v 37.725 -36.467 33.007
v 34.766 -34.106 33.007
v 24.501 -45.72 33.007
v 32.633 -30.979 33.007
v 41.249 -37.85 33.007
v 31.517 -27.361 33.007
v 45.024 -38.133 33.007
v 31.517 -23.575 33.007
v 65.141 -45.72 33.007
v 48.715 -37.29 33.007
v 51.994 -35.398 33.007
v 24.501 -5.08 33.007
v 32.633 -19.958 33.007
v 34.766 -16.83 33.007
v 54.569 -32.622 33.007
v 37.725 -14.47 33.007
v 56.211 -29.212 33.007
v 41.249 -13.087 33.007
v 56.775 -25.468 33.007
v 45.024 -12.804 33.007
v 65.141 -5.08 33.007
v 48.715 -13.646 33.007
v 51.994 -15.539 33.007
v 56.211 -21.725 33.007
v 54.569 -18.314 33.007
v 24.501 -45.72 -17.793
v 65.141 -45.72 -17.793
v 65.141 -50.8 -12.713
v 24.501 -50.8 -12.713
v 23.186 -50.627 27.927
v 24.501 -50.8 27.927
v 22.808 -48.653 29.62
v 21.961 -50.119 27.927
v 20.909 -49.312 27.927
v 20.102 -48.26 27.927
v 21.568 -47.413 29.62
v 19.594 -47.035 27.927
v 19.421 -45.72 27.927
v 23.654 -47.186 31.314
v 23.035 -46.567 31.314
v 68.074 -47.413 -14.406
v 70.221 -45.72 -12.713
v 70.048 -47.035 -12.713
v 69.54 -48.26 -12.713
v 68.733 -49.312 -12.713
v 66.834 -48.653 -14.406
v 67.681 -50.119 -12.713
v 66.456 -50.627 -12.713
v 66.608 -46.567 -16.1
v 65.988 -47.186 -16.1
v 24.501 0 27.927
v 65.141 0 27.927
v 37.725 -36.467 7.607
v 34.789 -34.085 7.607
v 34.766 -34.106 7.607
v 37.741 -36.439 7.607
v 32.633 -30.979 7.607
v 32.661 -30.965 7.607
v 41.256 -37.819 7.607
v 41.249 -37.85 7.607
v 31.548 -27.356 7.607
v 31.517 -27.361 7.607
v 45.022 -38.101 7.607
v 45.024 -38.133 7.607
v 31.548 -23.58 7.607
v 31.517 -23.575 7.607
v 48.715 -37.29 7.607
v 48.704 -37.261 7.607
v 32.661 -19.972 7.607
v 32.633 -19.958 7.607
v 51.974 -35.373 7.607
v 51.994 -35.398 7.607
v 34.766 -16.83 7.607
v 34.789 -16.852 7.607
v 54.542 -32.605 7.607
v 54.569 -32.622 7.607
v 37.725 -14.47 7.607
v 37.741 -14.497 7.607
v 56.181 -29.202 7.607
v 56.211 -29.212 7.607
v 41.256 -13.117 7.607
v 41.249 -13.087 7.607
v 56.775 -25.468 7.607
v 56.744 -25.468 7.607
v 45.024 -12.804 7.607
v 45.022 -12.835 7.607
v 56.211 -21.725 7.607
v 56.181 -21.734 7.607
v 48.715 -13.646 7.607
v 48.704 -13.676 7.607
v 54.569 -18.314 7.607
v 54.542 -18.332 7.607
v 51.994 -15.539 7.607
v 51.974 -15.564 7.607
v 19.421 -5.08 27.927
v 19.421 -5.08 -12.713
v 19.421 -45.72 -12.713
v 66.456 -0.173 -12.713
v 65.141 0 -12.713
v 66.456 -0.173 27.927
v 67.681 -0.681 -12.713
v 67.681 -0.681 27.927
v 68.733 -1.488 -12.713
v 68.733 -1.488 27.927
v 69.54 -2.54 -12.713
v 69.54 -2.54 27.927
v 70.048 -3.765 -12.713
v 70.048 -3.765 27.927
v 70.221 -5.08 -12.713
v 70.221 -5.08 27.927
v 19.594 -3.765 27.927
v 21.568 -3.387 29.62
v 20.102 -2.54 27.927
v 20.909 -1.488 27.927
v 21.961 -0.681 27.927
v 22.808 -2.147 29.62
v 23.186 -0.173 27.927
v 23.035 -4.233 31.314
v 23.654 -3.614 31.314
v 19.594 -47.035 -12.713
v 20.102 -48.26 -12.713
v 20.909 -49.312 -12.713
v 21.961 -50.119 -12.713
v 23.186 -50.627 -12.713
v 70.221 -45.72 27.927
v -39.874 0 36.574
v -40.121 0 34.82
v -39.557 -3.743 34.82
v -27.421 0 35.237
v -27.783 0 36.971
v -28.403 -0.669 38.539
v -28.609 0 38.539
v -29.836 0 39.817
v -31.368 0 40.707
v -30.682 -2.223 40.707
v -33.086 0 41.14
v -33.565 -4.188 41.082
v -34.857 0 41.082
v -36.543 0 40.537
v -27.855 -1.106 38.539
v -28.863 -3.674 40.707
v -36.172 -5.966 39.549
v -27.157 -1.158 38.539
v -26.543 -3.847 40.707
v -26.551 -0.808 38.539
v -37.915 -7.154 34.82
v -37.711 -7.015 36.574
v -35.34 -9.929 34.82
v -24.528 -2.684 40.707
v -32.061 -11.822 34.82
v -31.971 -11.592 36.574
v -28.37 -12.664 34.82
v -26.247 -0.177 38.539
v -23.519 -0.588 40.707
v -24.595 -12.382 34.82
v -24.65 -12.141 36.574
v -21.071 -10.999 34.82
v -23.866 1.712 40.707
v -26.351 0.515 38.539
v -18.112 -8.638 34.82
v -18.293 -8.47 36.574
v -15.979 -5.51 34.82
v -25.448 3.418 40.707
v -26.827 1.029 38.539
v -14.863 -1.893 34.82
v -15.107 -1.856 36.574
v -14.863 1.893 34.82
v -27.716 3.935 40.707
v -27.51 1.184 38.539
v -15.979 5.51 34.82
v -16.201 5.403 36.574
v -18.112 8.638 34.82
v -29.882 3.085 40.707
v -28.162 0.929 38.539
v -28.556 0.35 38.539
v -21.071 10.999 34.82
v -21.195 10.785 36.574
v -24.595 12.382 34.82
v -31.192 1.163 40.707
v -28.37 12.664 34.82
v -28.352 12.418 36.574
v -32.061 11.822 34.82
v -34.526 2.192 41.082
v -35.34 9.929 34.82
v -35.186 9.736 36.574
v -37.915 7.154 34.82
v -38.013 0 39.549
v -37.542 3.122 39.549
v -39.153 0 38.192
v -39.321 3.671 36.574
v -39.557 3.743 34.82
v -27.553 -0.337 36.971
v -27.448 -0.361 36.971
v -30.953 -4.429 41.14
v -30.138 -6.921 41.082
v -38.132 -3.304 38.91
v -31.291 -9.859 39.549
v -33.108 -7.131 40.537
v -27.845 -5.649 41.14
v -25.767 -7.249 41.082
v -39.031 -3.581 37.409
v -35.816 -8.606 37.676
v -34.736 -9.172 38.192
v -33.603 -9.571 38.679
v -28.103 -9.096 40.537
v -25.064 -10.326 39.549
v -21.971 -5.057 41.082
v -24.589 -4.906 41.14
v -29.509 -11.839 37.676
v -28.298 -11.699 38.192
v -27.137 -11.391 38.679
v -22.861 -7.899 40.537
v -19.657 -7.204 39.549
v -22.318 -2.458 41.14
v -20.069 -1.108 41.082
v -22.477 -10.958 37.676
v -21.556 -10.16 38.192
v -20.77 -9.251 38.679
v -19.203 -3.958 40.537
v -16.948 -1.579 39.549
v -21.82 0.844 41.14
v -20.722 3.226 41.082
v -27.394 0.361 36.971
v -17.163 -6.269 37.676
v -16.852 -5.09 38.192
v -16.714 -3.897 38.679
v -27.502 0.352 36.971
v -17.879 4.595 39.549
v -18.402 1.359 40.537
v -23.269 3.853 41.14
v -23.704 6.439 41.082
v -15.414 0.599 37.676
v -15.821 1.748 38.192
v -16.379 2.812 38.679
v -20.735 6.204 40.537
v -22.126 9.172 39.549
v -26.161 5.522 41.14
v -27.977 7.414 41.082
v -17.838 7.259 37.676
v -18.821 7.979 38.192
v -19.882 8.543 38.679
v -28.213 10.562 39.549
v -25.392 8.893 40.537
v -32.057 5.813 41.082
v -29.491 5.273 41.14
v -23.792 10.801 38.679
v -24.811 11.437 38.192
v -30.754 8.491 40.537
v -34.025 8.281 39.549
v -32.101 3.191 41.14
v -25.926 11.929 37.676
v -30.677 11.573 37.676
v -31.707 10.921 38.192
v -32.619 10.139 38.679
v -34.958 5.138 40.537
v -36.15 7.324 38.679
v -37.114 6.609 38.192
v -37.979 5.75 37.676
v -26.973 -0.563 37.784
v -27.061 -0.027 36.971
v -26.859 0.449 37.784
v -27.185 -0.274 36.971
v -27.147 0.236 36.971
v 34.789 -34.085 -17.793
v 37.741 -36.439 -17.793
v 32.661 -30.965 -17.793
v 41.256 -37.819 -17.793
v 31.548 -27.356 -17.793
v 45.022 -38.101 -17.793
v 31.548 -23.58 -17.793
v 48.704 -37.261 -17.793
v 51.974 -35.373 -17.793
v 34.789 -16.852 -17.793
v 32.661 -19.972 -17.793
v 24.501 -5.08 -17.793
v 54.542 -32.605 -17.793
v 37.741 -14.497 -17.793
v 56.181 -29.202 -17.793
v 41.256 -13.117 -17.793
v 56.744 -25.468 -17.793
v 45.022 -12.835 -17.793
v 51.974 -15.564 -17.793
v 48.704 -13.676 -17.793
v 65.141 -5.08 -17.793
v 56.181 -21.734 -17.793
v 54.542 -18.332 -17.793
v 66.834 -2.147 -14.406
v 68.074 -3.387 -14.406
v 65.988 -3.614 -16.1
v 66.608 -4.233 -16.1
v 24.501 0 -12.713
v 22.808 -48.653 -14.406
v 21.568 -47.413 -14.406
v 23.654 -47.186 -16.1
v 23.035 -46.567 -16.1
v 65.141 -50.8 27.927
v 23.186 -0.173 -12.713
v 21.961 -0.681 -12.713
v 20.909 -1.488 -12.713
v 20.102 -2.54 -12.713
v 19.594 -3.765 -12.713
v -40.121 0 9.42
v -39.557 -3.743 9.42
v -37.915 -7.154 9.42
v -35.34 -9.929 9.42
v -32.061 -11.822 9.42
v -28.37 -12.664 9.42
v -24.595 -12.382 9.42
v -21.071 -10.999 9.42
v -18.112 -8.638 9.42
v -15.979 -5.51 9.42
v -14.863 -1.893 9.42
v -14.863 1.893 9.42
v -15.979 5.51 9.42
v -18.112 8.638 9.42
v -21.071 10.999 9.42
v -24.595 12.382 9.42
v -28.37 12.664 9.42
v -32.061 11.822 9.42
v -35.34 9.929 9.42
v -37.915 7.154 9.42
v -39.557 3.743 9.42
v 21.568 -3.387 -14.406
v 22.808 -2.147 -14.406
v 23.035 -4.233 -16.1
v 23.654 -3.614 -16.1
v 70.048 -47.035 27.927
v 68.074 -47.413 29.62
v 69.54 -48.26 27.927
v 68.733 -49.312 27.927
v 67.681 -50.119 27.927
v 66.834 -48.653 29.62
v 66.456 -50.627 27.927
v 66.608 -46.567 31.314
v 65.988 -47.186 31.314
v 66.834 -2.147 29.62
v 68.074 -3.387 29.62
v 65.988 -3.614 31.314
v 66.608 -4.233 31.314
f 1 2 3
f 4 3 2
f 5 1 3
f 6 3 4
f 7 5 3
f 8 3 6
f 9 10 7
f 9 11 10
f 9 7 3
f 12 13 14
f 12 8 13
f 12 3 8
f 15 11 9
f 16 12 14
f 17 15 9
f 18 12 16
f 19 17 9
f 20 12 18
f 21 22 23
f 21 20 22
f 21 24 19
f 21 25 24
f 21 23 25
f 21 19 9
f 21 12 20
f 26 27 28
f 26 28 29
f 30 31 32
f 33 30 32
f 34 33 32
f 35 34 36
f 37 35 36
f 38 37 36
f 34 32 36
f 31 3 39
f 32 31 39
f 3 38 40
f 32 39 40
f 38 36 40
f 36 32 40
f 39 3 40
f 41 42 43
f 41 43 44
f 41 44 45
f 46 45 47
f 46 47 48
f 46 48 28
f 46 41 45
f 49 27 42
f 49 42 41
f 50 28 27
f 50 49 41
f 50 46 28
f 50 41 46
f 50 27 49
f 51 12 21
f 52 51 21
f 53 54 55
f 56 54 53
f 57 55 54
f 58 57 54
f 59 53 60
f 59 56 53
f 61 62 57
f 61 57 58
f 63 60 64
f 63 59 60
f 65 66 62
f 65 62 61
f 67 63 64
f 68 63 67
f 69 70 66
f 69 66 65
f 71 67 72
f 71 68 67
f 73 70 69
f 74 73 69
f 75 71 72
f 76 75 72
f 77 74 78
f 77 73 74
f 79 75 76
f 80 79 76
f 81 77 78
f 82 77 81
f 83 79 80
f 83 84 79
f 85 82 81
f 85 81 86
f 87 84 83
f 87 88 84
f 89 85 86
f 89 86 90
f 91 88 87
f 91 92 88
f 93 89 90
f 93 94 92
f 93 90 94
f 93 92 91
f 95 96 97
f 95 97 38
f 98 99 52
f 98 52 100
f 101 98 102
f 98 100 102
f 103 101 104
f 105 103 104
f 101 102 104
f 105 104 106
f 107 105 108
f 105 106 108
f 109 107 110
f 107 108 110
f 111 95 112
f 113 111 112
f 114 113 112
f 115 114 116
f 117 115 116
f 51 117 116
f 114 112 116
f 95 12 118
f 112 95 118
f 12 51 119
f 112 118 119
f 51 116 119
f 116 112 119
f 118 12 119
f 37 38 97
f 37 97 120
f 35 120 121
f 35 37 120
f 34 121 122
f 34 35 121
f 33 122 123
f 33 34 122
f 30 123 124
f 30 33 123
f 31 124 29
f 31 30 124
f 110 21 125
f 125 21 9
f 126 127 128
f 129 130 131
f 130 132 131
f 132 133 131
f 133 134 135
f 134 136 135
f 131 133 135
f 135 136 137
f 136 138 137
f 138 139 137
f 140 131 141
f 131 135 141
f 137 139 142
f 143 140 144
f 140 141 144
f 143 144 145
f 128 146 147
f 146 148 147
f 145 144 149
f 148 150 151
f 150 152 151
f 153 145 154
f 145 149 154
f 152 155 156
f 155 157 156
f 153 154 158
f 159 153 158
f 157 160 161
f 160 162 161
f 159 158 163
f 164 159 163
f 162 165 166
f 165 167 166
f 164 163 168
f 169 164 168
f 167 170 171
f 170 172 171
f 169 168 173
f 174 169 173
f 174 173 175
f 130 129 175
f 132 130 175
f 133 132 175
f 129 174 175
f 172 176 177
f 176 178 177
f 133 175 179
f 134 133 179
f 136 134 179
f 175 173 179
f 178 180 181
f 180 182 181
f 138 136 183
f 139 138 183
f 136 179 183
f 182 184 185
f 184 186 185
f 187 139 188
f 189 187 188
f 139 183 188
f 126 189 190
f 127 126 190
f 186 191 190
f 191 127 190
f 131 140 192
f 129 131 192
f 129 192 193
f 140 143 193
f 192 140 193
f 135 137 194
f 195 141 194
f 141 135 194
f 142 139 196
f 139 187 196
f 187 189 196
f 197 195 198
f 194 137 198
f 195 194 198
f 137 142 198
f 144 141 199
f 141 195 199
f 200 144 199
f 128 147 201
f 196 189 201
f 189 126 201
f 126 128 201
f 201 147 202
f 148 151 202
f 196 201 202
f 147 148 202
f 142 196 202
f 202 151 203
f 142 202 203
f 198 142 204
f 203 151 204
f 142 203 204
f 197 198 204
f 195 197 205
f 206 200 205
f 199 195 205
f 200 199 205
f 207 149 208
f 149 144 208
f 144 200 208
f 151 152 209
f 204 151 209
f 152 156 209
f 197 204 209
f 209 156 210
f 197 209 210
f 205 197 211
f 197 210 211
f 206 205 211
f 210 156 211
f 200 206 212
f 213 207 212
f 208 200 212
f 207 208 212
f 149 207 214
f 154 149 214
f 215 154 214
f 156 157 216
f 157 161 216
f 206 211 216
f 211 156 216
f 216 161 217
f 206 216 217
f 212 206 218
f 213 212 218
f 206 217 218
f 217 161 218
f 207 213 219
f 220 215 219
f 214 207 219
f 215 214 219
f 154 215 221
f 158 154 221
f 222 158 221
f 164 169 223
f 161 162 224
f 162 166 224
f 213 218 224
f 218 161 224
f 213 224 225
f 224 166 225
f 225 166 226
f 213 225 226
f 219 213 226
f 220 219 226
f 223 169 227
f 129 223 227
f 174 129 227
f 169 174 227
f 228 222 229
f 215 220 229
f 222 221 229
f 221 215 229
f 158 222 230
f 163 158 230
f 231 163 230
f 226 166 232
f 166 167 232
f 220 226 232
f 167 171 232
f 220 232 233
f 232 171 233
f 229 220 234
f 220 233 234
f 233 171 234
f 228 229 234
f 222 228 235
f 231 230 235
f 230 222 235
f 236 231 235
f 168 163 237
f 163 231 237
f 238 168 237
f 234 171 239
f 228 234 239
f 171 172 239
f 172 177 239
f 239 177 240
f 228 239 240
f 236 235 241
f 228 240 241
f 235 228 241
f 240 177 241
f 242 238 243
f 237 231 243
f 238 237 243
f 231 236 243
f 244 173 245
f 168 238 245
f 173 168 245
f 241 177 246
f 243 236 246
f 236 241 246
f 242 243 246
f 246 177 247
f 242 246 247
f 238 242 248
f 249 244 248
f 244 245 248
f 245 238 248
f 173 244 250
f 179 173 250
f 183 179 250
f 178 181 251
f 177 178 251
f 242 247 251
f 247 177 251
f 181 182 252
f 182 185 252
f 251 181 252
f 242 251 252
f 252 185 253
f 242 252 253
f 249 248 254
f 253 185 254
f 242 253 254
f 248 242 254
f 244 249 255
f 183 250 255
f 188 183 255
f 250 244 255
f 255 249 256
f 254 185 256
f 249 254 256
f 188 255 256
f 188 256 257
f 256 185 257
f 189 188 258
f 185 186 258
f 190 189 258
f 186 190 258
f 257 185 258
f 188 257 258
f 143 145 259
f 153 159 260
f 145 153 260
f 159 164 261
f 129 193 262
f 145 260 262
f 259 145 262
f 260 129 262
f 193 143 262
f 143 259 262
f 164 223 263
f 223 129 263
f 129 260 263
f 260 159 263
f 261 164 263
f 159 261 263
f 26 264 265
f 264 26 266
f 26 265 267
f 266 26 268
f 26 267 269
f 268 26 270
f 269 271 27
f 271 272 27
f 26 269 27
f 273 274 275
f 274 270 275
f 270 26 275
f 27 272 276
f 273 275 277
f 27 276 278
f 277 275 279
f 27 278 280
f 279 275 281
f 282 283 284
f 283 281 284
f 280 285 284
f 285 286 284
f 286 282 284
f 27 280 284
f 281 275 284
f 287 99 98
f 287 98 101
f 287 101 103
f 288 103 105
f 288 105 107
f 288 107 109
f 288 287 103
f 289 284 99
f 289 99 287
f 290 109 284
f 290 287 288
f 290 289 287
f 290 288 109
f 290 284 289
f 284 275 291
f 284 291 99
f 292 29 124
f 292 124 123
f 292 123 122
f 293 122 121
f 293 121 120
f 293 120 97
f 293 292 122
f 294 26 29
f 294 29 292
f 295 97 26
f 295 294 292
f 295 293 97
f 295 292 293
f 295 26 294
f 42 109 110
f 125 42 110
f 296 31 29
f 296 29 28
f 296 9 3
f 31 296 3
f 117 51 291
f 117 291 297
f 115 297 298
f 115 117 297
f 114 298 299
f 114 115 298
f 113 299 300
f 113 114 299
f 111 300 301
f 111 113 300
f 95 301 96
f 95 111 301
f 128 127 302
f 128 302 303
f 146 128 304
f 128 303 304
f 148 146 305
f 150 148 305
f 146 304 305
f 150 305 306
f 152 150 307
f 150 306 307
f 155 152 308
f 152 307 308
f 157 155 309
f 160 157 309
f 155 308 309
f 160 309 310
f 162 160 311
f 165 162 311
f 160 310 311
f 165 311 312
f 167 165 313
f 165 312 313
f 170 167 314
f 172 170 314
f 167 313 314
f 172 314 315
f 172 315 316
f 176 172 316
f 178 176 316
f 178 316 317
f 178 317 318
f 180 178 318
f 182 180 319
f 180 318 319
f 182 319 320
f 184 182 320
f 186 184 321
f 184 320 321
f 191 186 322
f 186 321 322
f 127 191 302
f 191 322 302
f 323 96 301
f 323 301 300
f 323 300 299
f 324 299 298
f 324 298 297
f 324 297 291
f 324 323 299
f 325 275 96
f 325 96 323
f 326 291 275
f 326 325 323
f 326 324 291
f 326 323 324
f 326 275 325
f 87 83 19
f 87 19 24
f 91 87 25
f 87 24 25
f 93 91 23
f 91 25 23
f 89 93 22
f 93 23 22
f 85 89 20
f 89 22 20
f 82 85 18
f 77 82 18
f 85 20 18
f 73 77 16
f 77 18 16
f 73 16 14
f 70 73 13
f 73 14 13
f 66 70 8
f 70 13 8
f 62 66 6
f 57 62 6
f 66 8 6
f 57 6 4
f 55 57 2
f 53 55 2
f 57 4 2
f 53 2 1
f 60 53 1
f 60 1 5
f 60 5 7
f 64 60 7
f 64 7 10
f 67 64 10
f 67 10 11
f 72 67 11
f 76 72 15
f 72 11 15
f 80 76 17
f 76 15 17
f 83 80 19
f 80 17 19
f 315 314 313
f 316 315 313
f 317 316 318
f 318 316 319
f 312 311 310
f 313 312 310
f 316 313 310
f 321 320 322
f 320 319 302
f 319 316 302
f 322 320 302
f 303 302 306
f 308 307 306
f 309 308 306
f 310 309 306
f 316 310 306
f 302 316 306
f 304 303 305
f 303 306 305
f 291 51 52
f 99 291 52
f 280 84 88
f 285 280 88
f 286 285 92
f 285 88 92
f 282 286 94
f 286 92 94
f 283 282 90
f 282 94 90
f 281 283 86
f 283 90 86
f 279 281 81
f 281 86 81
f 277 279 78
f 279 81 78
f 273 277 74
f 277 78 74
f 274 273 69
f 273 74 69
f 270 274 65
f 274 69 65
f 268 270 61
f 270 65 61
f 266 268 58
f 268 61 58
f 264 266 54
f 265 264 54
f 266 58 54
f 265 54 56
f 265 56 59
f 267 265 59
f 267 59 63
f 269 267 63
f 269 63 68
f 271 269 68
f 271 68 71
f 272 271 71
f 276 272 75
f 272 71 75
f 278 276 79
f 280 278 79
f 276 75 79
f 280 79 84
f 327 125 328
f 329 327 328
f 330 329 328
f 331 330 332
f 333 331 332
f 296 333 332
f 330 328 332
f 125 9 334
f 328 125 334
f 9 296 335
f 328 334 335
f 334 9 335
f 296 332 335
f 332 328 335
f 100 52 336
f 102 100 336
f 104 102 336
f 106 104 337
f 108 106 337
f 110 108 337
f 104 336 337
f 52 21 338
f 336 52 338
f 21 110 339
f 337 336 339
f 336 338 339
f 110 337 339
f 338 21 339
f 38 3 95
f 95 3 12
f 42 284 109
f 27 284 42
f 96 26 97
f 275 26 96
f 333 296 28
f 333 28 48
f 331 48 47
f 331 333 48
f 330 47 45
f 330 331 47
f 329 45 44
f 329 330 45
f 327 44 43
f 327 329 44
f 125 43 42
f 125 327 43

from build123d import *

# Parameters (mm, degrees)
F2_W      = 50.8
F2_H      = 50.8
F3_DEPTH  = 50.8
F4_R      = 5.08
F5_R      = 5.08
F6_R      = 5.08
F7_SIZE   = 5.07999
F8_SIZE   = 5.07999
F9_R      = 12.7
F10_DEPTH = 25.4
F11_R     = 12.6684377853
F12_DEPTH = 25.4


# Not quite as in the source:
# - a fillet or chamfer is up to 0.001 mm smaller than in the source, because OpenCascade refuses the exact size


with BuildPart() as f1:
    # F0 (on Front) → F1 (revolve)
    with BuildSketch(Plane.XZ):
        with BuildLine():
            ThreePointArc((-27.421294558, 35.2369621396), (-33.9731451561, 41.1732071319), (-40.121294558, 34.8197820872))
            Line((-40.121294558, 34.8197820872), (-40.121294558, 9.4197820872))
            Line((-40.121294558, 9.4197820872), (-27.421294558, 9.4197820872))
            Line((-27.421294558, 9.4197820872), (-27.421294558, 35.2369621396))
        make_face()
    revolve(axis=Axis((-27.421294558, 0, 22.3283721134), (0, 0, 1)))


with BuildPart() as f3:
    # F2 (on Front) → F3 (new body)
    with BuildSketch(Plane.XZ):
        with Locations((44.8210335612, 7.6070784867)):
            Rectangle(F2_W, F2_H)
    extrude(amount=F3_DEPTH)

    # F4
    f4_edges = [f3.edges().sort_by_distance(p)[0] for p in [
        (19.421034, -50.8, 7.607078),
    ]]
    fillet(f4_edges, radius=F4_R)

    # F5
    f5_edges = [f3.edges().sort_by_distance(p)[0] for p in [
        (70.221034, -50.8, 7.607078),
        (70.221034, 0, 7.607078),
    ]]
    fillet(f5_edges, radius=F5_R)

    # F6
    f6_edges = [f3.edges().sort_by_distance(p)[0] for p in [
        (19.421034, 0, 7.607078),
    ]]
    fillet(f6_edges, radius=F6_R)

    # F7 (size 5.08 in the source; OpenCascade refuses exactly that, so slightly less here)
    f7_edges = [f3.edges().sort_by_distance(p)[0] for p in [
        (44.821034, 0, 33.007078),
        (20.908931, -1.487898, 33.007078),
        (68.733136, -1.487898, 33.007078),
        (19.421034, -25.4, 33.007078),
        (70.221034, -25.4, 33.007078),
        (20.908931, -49.312102, 33.007078),
        (68.733136, -49.312102, 33.007078),
        (44.821034, -50.8, 33.007078),
    ]]
    chamfer(f7_edges, length=F7_SIZE)

    # F8 (size 5.08 in the source; OpenCascade refuses exactly that, so slightly less here)
    f8_edges = [f3.edges().sort_by_distance(p)[0] for p in [
        (44.821034, 0, -17.792922),
        (20.908931, -1.487898, -17.792922),
        (68.733136, -1.487898, -17.792922),
        (19.421034, -25.4, -17.792922),
        (70.221034, -25.4, -17.792922),
        (20.908931, -49.312102, -17.792922),
        (68.733136, -49.312102, -17.792922),
        (44.821034, -50.8, -17.792922),
    ]]
    chamfer(f8_edges, length=F8_SIZE)

    # F9 (on face) → F10 (cut)
    with BuildSketch(Plane.XY.offset(33.0070784867)):
        with Locations((44.0752767026, -25.4682991654)):
            Circle(F9_R)
    extrude(amount=-F10_DEPTH, mode=Mode.SUBTRACT)

    # F11 (on face) → F12 (cut)
    with BuildSketch(Plane.XY.offset(7.6070784867)):
        with Locations((44.0752767026, -25.4682991654)):
            Circle(F11_R)
    extrude(amount=-F12_DEPTH, mode=Mode.SUBTRACT)


solid = Compound([f1.part, f3.part])
